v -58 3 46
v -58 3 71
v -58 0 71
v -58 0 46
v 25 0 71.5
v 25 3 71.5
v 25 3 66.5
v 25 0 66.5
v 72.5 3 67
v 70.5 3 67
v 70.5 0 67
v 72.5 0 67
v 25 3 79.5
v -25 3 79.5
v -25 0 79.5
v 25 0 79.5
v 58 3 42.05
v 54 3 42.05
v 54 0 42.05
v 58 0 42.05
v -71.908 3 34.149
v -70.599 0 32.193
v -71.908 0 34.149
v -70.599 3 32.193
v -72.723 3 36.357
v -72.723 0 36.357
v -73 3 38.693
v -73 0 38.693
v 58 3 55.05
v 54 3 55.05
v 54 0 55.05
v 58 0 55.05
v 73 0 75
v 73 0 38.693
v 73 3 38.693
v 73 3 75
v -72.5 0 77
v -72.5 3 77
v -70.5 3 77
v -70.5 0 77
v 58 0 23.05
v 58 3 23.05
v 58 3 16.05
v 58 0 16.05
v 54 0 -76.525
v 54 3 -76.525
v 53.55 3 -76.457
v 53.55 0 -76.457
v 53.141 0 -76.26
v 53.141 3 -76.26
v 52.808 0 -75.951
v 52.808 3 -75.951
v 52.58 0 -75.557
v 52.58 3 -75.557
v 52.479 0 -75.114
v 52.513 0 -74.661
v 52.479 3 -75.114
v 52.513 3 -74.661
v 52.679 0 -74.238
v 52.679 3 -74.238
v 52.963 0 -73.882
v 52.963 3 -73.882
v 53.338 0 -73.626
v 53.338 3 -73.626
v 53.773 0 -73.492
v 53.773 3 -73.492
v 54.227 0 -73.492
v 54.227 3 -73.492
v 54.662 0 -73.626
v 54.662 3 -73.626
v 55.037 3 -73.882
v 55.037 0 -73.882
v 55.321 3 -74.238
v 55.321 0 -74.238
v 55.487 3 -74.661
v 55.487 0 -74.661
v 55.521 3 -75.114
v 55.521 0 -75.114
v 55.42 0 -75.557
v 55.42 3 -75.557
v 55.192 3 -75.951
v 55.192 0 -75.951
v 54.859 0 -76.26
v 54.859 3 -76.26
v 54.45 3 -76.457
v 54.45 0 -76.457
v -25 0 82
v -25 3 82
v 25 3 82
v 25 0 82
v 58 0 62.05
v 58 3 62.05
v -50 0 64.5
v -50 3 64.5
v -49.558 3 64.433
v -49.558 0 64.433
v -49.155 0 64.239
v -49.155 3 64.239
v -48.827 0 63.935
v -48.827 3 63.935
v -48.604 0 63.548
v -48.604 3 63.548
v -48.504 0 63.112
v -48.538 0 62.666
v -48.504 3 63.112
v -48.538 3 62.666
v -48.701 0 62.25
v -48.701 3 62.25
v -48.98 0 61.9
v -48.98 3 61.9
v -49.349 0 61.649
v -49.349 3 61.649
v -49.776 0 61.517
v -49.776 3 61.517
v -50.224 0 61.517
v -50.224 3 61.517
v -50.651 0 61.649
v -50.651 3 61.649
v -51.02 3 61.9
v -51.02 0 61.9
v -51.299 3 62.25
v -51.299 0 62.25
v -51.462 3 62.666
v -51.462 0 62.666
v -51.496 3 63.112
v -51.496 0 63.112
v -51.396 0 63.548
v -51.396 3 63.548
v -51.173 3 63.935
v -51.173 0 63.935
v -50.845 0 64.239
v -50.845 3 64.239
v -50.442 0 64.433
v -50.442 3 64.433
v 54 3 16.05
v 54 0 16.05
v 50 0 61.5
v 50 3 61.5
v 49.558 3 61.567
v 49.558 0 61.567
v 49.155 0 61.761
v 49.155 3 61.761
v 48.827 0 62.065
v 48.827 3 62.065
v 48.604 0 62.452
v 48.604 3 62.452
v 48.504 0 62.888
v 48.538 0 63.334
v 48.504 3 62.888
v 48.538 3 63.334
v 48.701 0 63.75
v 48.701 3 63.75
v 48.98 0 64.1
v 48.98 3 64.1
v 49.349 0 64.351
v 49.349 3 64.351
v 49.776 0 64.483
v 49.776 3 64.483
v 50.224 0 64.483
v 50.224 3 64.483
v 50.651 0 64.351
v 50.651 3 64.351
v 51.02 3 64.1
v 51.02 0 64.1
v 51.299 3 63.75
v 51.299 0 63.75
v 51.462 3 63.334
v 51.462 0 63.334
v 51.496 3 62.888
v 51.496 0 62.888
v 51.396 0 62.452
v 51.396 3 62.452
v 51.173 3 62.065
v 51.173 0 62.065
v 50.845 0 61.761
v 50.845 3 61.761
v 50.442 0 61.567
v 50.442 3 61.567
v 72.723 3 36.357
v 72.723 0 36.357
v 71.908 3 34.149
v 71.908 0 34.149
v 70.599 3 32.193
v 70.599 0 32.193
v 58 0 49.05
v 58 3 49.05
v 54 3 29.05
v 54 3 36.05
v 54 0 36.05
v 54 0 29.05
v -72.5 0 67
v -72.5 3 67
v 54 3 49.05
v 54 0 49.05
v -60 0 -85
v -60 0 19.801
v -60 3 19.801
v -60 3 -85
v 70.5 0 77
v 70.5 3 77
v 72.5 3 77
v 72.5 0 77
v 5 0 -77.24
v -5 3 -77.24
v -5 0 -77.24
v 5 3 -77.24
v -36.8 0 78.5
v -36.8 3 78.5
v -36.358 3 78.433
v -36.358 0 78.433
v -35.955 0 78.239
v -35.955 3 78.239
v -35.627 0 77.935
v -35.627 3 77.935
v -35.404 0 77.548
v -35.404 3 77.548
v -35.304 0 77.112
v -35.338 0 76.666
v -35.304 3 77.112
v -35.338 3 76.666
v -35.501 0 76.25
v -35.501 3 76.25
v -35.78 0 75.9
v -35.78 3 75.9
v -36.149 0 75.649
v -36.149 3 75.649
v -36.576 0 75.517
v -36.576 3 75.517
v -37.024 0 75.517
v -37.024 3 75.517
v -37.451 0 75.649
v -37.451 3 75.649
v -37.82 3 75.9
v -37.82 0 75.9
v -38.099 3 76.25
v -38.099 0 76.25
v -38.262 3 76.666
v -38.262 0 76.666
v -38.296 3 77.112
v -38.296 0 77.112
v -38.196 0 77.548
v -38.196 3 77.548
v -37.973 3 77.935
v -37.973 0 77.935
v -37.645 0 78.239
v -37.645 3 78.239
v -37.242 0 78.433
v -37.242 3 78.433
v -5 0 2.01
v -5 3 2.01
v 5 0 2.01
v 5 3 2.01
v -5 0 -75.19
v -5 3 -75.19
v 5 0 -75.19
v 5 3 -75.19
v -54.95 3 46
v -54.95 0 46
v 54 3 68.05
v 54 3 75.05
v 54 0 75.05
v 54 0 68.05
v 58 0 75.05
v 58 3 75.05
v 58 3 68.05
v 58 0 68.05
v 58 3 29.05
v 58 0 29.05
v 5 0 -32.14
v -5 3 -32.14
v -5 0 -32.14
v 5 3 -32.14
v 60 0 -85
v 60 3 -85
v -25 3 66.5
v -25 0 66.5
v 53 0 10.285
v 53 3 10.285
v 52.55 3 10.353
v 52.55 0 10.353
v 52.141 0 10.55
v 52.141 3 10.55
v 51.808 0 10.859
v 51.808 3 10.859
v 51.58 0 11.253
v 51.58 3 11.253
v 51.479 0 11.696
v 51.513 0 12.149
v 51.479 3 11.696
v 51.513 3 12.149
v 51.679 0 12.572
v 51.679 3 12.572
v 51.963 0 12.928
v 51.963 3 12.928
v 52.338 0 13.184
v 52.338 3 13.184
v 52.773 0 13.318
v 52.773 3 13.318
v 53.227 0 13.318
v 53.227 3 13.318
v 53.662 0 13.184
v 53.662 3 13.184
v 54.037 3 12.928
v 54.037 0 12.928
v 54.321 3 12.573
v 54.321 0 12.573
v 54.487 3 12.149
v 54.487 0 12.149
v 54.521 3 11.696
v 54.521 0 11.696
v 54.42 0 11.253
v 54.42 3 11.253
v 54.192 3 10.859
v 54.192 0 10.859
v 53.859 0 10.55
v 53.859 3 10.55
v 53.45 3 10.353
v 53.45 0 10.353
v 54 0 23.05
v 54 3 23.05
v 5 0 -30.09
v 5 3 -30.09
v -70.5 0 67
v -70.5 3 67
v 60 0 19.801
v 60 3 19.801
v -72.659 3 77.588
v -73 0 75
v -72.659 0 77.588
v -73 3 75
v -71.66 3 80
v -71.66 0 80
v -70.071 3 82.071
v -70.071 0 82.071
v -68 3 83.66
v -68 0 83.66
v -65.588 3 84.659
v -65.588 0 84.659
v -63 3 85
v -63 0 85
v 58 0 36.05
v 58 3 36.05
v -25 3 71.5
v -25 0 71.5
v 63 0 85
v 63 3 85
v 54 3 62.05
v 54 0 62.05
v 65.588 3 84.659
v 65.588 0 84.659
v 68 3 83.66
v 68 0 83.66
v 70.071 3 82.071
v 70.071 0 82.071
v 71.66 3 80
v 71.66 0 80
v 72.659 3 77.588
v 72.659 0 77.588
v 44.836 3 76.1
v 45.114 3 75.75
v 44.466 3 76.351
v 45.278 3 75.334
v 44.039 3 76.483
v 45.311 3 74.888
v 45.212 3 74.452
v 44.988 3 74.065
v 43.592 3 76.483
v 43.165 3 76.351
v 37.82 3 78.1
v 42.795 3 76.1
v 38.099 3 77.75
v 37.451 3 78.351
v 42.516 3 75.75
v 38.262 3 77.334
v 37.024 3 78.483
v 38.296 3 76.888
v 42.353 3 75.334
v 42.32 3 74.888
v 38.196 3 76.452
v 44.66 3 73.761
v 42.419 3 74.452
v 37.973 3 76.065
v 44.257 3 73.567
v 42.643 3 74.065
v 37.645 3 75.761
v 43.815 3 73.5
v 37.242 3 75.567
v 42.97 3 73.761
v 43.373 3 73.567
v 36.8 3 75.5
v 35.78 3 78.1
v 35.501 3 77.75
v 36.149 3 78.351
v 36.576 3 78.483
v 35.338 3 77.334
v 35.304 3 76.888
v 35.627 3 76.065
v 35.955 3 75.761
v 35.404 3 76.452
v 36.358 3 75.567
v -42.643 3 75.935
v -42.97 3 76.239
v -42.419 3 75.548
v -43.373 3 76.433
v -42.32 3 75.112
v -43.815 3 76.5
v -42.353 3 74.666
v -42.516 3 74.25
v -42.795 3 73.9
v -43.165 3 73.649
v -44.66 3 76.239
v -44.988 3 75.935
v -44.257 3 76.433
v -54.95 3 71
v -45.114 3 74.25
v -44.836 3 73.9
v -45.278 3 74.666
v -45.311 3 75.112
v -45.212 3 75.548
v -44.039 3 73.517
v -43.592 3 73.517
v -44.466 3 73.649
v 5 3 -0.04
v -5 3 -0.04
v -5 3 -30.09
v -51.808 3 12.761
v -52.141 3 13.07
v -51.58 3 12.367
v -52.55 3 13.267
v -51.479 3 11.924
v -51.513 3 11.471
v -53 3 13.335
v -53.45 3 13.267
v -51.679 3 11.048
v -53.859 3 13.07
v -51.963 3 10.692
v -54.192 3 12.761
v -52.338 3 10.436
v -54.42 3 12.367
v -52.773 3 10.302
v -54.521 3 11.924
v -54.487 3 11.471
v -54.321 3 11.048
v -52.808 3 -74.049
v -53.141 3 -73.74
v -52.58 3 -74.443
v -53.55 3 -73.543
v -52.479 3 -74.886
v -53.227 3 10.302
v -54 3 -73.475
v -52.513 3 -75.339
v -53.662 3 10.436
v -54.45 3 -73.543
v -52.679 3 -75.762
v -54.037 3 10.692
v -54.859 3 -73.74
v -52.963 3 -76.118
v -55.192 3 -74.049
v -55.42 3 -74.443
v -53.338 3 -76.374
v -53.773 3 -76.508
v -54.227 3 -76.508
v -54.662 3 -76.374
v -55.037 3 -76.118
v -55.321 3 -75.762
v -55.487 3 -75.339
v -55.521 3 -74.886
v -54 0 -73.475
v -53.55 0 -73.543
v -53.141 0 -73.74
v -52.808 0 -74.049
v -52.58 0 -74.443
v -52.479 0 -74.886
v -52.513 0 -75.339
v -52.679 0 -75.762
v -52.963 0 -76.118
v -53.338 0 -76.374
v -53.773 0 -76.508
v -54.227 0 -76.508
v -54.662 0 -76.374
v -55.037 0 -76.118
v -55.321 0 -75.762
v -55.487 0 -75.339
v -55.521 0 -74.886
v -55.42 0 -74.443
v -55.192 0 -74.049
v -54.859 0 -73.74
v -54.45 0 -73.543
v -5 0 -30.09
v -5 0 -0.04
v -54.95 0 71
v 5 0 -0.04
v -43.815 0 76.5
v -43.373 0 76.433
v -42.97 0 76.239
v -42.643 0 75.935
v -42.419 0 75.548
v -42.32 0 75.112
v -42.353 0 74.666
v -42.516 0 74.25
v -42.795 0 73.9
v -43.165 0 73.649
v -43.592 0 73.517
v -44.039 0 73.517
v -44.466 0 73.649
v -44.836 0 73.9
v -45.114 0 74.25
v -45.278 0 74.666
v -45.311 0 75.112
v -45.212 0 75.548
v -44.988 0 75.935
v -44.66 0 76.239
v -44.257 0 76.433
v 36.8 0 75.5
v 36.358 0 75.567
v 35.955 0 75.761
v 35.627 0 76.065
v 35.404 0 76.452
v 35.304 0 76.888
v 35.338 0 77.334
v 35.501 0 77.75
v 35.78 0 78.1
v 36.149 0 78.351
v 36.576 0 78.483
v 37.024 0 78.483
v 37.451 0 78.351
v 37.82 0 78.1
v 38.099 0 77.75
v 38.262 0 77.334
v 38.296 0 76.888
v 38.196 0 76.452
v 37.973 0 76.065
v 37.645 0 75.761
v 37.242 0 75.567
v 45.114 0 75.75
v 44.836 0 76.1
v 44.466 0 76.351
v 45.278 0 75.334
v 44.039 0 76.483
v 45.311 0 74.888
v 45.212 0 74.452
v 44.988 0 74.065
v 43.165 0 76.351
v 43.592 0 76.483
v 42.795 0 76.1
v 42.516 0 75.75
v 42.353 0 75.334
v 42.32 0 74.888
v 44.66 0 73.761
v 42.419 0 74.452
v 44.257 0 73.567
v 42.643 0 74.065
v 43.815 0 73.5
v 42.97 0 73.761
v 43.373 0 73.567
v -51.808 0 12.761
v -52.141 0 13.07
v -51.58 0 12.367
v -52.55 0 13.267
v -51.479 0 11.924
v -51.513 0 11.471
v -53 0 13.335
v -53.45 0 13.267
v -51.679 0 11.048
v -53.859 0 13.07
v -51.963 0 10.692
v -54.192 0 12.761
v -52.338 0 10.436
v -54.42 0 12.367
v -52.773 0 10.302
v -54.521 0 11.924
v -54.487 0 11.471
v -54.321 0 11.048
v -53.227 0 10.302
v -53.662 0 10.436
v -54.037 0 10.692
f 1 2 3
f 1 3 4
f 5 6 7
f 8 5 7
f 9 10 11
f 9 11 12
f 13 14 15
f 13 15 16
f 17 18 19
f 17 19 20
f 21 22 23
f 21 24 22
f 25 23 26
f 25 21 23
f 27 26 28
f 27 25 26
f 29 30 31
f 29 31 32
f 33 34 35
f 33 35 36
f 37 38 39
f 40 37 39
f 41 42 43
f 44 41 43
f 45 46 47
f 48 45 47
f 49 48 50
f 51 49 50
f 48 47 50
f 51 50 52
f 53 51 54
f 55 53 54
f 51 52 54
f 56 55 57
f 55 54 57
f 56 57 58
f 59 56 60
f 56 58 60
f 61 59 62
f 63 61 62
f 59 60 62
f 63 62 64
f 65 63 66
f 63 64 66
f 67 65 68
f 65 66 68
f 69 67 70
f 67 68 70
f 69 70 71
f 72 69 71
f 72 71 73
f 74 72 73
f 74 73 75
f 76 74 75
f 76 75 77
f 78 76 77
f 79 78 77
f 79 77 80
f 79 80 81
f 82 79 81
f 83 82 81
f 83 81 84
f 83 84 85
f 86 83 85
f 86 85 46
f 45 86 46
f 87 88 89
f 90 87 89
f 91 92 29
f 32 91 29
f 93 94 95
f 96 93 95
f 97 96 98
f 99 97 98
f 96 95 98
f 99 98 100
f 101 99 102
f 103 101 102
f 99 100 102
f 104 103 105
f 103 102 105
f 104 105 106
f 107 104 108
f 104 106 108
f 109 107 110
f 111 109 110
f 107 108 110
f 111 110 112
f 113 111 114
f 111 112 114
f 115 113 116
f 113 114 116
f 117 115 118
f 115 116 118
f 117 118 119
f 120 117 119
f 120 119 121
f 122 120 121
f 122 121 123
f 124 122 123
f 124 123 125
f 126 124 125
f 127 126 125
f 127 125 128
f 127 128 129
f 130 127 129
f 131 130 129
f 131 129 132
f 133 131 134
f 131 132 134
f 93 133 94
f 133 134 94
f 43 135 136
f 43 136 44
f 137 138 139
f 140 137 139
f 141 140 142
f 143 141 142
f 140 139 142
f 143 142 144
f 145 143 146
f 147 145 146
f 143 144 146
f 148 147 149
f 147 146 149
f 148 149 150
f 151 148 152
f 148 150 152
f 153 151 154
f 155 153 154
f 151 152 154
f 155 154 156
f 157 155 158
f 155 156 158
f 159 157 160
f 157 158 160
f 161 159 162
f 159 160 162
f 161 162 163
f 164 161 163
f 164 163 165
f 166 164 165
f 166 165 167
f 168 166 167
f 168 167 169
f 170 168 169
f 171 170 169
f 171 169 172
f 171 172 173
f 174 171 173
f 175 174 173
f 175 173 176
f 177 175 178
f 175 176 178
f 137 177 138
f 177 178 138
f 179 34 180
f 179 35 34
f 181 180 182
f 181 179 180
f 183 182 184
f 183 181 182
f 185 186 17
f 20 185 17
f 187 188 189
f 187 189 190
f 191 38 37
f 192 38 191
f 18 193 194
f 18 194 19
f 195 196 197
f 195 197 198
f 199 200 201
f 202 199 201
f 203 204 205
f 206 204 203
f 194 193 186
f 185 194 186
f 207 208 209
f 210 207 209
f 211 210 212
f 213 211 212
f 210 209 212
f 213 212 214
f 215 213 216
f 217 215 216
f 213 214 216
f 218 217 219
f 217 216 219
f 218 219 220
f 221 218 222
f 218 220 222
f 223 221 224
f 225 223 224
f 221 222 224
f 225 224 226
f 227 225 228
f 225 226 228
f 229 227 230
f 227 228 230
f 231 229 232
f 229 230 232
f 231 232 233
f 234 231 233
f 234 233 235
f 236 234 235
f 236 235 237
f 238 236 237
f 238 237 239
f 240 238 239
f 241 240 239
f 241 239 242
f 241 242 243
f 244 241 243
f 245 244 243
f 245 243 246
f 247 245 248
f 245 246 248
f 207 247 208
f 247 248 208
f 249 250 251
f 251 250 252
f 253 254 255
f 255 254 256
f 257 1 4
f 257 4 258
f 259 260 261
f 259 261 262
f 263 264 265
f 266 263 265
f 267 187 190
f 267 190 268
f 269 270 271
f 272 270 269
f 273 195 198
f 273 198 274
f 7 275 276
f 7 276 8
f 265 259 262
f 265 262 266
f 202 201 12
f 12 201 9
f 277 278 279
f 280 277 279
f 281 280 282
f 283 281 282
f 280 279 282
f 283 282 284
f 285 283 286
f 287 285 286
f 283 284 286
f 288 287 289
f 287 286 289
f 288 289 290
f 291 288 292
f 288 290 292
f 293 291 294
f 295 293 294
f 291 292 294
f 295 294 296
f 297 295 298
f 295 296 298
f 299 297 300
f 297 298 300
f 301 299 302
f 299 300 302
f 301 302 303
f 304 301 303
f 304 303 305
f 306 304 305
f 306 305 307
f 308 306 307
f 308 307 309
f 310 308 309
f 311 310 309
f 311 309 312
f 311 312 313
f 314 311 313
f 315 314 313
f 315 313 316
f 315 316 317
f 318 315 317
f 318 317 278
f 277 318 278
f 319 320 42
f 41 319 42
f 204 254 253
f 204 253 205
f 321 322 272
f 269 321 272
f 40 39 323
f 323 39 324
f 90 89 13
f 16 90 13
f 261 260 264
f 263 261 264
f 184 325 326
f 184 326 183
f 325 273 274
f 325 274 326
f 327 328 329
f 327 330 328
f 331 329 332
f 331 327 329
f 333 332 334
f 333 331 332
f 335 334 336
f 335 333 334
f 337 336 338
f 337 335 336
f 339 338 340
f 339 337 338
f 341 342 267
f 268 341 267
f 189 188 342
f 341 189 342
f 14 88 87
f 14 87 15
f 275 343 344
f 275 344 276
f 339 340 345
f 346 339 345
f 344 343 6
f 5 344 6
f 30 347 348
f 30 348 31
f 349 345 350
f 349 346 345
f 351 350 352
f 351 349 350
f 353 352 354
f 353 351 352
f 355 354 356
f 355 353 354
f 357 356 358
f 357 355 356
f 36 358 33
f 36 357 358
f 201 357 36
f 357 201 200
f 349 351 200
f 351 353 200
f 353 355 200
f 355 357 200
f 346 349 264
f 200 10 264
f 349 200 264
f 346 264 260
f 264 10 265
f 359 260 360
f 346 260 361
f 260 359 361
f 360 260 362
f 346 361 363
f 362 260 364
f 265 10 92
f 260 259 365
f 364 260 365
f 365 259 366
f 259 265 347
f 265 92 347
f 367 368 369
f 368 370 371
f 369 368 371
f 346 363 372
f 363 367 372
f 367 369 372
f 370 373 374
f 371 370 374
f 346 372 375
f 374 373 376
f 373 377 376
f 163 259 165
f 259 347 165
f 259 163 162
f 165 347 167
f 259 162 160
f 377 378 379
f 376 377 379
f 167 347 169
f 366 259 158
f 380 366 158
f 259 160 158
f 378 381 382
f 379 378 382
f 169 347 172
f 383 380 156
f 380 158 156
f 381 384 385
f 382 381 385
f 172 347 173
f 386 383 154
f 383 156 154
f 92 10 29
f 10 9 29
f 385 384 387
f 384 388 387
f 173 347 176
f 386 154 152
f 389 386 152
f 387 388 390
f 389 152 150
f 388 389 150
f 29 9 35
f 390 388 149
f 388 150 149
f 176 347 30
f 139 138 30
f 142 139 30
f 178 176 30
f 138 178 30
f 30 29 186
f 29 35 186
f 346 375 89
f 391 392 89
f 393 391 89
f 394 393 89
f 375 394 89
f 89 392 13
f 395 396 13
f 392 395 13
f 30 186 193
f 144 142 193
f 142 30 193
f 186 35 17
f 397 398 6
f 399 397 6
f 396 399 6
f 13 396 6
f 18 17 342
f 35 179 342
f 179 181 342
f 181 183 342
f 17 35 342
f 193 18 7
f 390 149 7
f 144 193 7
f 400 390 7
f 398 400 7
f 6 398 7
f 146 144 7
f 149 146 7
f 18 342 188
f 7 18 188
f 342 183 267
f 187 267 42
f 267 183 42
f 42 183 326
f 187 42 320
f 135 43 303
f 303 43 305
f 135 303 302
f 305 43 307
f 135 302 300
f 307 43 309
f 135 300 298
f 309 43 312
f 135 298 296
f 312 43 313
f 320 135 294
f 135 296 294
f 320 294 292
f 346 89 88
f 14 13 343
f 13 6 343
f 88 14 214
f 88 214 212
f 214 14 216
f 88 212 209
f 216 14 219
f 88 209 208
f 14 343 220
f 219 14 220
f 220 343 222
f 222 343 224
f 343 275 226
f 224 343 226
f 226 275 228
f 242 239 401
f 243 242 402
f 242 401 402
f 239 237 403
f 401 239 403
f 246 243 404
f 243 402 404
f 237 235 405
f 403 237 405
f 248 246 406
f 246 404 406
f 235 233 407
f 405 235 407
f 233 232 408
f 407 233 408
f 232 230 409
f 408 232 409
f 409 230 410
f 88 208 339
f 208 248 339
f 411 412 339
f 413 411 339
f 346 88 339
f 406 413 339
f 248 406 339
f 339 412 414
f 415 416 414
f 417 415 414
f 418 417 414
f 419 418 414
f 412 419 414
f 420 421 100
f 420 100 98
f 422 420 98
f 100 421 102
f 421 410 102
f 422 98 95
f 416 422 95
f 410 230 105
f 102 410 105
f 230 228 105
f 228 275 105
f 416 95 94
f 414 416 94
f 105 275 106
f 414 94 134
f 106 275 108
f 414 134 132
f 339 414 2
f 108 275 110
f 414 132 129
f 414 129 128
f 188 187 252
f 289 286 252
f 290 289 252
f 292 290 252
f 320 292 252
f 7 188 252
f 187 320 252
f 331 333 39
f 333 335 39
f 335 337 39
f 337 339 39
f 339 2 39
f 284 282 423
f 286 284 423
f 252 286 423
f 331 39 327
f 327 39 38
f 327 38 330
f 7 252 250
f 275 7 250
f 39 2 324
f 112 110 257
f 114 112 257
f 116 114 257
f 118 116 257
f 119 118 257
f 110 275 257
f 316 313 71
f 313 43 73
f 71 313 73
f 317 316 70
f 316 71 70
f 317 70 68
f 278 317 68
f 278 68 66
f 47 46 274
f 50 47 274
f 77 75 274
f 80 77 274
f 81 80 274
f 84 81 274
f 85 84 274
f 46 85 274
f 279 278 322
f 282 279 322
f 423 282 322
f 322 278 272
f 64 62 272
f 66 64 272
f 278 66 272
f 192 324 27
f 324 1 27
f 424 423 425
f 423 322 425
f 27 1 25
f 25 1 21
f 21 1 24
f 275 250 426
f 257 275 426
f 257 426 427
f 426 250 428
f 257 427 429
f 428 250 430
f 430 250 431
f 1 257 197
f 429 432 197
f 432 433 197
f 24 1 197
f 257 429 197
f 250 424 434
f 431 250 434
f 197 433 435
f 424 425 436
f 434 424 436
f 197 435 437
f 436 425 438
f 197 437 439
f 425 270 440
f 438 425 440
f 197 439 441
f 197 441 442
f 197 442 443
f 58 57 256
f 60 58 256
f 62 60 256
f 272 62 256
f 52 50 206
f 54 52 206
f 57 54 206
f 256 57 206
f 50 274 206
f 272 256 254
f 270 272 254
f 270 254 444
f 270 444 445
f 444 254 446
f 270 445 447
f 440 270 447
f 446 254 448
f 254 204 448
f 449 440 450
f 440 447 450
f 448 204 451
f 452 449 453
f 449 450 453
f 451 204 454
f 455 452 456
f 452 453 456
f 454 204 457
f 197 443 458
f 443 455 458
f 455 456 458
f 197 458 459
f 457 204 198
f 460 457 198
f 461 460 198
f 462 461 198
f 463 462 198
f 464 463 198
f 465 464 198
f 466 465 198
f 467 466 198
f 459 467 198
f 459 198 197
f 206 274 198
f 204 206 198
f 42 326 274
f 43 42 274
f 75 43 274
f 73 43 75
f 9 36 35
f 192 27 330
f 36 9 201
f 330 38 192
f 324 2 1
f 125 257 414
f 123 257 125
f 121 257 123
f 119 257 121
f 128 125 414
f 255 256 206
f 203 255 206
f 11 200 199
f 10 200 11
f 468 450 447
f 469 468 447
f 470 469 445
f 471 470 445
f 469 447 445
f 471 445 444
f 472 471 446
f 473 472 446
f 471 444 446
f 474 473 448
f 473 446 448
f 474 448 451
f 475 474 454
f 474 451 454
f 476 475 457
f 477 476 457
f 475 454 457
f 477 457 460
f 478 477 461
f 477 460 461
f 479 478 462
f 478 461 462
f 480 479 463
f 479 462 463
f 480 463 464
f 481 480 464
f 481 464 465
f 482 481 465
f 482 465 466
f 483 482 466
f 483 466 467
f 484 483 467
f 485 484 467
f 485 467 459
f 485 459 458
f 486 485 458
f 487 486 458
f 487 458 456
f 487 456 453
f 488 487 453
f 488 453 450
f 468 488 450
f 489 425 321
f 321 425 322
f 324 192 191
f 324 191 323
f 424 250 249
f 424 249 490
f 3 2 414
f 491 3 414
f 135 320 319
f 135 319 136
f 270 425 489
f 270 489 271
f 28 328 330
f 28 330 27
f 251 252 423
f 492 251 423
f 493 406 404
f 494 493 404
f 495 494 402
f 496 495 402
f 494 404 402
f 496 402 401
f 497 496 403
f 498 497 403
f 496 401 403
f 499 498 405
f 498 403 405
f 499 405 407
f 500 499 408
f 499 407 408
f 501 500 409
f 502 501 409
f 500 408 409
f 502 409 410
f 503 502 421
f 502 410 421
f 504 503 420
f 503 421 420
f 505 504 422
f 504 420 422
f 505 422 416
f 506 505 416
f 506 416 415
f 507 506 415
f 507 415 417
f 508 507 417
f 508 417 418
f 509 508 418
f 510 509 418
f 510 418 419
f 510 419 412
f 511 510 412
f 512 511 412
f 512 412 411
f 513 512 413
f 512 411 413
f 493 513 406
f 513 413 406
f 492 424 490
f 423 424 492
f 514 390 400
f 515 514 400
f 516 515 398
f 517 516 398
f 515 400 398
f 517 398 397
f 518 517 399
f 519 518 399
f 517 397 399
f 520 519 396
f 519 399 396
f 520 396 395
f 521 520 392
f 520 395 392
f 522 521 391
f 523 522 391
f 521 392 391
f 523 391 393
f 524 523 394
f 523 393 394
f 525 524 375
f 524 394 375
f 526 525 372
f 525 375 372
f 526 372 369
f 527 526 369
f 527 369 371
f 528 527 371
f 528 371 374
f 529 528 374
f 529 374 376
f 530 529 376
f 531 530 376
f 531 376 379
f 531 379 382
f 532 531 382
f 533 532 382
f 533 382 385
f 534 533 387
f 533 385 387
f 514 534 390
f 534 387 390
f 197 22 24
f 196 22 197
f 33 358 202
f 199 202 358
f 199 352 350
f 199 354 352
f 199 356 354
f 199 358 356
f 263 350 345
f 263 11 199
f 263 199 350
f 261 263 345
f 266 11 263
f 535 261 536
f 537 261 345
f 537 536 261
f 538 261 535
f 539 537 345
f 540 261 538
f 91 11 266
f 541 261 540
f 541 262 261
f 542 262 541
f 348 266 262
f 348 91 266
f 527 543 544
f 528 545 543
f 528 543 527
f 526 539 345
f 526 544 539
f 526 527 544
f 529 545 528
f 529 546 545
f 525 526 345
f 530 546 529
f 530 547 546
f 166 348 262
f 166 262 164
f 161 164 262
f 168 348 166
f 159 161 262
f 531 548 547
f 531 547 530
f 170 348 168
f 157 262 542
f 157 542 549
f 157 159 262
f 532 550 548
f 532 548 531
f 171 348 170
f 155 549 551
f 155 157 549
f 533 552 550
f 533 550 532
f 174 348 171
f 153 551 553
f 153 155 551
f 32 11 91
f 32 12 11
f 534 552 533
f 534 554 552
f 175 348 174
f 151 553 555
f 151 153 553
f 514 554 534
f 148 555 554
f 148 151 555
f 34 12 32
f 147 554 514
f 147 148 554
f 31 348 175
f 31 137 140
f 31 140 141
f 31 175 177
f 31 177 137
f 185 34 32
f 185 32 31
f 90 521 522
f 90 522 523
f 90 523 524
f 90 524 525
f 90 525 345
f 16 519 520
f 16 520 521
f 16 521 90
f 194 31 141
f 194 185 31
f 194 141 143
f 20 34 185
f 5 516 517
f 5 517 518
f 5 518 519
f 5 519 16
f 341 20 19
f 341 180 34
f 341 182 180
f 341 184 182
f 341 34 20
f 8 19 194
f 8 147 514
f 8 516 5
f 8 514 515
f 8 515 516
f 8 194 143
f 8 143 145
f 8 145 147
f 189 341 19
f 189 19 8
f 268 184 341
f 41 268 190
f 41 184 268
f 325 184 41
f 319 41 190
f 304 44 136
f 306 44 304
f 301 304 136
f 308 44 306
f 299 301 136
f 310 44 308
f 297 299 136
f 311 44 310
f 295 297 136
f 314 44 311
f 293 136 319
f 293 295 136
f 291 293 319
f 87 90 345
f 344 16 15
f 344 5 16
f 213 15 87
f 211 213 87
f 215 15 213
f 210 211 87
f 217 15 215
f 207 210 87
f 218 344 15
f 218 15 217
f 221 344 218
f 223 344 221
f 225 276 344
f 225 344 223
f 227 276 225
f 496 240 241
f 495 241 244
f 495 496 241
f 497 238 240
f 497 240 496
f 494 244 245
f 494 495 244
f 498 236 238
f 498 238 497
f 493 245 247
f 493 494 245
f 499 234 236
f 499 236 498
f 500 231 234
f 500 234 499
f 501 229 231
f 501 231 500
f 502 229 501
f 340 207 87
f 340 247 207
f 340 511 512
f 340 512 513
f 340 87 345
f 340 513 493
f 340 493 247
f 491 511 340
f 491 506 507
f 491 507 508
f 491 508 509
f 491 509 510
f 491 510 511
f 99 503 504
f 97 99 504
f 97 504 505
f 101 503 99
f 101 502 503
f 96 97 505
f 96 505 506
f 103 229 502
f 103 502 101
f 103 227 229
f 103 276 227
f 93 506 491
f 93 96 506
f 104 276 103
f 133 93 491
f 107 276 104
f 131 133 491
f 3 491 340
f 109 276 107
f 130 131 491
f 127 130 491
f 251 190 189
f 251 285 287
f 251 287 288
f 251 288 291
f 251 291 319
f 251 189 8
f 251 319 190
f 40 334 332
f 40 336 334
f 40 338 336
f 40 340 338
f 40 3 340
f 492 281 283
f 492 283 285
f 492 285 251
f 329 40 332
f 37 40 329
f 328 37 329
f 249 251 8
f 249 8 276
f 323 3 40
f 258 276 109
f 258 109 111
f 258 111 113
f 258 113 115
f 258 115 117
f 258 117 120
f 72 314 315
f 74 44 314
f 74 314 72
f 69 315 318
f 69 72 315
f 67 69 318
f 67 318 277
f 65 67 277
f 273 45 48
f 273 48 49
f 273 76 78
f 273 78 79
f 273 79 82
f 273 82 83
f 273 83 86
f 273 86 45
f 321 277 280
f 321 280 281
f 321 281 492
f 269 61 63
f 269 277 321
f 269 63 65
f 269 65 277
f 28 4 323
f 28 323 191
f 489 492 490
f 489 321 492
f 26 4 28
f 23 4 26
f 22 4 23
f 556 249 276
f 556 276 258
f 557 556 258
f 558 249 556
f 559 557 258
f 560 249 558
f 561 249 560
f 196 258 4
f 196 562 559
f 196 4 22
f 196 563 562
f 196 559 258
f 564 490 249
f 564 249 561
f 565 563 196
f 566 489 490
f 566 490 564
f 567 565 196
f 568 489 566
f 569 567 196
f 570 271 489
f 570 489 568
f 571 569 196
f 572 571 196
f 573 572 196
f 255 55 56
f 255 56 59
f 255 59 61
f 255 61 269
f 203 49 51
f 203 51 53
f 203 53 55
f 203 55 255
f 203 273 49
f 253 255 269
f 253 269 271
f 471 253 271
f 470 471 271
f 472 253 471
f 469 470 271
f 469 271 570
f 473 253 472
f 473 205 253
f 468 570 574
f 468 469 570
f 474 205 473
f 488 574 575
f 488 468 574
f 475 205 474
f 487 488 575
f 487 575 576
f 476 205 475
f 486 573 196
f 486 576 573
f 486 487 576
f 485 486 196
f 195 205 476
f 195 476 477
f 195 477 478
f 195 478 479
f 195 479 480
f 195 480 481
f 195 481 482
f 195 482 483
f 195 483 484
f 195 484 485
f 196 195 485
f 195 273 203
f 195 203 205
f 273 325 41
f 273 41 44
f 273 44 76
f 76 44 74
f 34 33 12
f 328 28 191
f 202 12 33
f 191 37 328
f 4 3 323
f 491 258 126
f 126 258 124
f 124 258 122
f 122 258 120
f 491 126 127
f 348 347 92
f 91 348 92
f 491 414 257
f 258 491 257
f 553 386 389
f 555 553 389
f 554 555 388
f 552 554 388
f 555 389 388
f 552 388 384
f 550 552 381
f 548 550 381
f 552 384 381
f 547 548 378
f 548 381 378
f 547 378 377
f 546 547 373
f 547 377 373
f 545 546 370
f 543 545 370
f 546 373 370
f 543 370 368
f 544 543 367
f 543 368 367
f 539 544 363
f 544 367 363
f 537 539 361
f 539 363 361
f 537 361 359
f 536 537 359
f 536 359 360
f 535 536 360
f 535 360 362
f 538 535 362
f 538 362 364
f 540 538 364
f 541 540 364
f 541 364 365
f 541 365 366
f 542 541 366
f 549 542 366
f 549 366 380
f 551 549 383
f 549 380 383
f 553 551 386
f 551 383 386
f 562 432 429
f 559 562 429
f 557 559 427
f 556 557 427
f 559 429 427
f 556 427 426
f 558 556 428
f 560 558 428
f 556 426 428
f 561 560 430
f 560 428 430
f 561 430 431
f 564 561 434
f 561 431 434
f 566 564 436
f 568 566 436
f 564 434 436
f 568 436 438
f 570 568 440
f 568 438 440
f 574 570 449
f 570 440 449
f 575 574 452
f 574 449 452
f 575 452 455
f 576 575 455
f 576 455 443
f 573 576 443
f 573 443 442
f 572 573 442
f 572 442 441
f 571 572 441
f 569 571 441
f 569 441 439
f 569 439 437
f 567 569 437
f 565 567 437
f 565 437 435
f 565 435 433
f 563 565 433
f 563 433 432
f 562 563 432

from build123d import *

# Parameters (mm, degrees)
BOSS_EXTRUDE1_DEPTH = 3
SKETCH2_R           = 1.525
CUT_EXTRUDE1_DEPTH  = 113.084789334
SKETCH3_W           = 10
SKETCH3_H           = 2.05
CUT_EXTRUDE2_DEPTH  = 113.084789334
SKETCH4_R           = 1.5
CUT_EXTRUDE3_DEPTH  = 3
SKETCH5_R           = 1.5
SKETCH5_W           = 50
SKETCH5_H           = 5
CUT_EXTRUDE4_DEPTH  = 3
SKETCH6_W           = 4
SKETCH6_H           = 7
CUT_EXTRUDE5_DEPTH  = 10
SKETCH7_W           = 50
SKETCH7_H           = 2.5
SKETCH7_W_2         = 3.05
SKETCH7_H_2         = 25
CUT_EXTRUDE6_DEPTH  = 10
FILLET3_R           = 10
SKETCH8_W           = 2
SKETCH8_H           = 10
CUT_EXTRUDE7_DEPTH  = 10


with BuildPart() as part:
    # Sketch1 → Boss-Extrude1 (new body)
    with BuildSketch(Plane(origin=(0, 0, 0), x_dir=(1, 0, 0), z_dir=(0, 1, 0))):
        Polygon((-73, -35), (-60, -19.801315846), (-60, 85), (60, 85), (60, -19.801315846), (73, -35), (73, -85), (60, -85), (-60, -85), (-73, -85), align=None)
    extrude(amount=BOSS_EXTRUDE1_DEPTH)

    # Sketch2 → Cut-Extrude1 (cut, through all)
    with BuildSketch(Plane(origin=(0, 3, 0), x_dir=(1, 0, 0), z_dir=(0, 1, 0))):
        with Locations(Location((-53, -11.81, 0), (0, 0, 270))):
            Circle(SKETCH2_R)
        with Locations(Location((-54, 75, 0), (0, 0, 270))):
            Circle(SKETCH2_R)
        with Locations(Location((53, -11.81, 0), (0, 0, 90))):
            Circle(SKETCH2_R)
        with Locations(Location((54, 75, 0), (0, 0, 90))):
            Circle(SKETCH2_R)
    extrude(amount=-CUT_EXTRUDE1_DEPTH, mode=Mode.SUBTRACT)

    # Sketch3 → Cut-Extrude2 (cut, through all)
    with BuildSketch(Plane(origin=(0, 3, 0), x_dir=(1, 0, 0), z_dir=(0, 1, 0))):
        with Locations((0, 31.115)):
            Rectangle(SKETCH3_W, SKETCH3_H)
        with Locations((0, -0.985)):
            Rectangle(SKETCH3_W, SKETCH3_H)
        with Locations((0, 76.215)):
            Rectangle(SKETCH3_W, SKETCH3_H)
    extrude(amount=-CUT_EXTRUDE2_DEPTH, mode=Mode.SUBTRACT)

    # Sketch4 → Cut-Extrude3 (cut)
    with BuildSketch(Plane(origin=(0, 3, 0), x_dir=(1, 0, 0), z_dir=(0, 1, 0))):
        with Locations(Location((-50, -63, 0), (0, 0, 270))):
            Circle(SKETCH4_R)
        with Locations(Location((-43.815341562, -75, 0), (0, 0, 270))):
            Circle(SKETCH4_R)
        with Locations(Location((43.815341562, -75, 0), (0, 0, 90))):
            Circle(SKETCH4_R)
        with Locations(Location((50, -63, 0), (0, 0, 90))):
            Circle(SKETCH4_R)
    extrude(amount=-CUT_EXTRUDE3_DEPTH, mode=Mode.SUBTRACT)

    # Sketch5 → Cut-Extrude4 (cut)
    with BuildSketch(Plane(origin=(0, 3, 0), x_dir=(1, 0, 0), z_dir=(0, 1, 0))):
        with Locations(Location((-36.8, -77, 0), (0, 0, 270))):
            Circle(SKETCH5_R)
        with Locations(Location((36.8, -77, 0), (0, 0, 90))):
            Circle(SKETCH5_R)
        with Locations((0, -69)):
            Rectangle(SKETCH5_W, SKETCH5_H)
    extrude(amount=-CUT_EXTRUDE4_DEPTH, mode=Mode.SUBTRACT)

    # Sketch6 → Cut-Extrude5 (cut)
    with BuildSketch(Plane(origin=(0, 3, 0), x_dir=(1, 0, 0), z_dir=(0, 1, 0))):
        with Locations((56, -32.549614417)):
            Rectangle(SKETCH6_W, SKETCH6_H)
        with Locations((56, -19.549614417)):
            Rectangle(SKETCH6_W, SKETCH6_H)
        with Locations((56, -45.549614417)):
            Rectangle(SKETCH6_W, SKETCH6_H)
        with Locations((56, -58.549614417)):
            Rectangle(SKETCH6_W, SKETCH6_H)
        with Locations((56, -71.549614417)):
            Rectangle(SKETCH6_W, SKETCH6_H)
    extrude(amount=-CUT_EXTRUDE5_DEPTH, mode=Mode.SUBTRACT)

    # Sketch7 → Cut-Extrude6 (cut)
    with BuildSketch(Plane(origin=(0, 3, 0), x_dir=(1, 0, 0), z_dir=(0, 1, 0))):
        with Locations((0, -80.75)):
            Rectangle(SKETCH7_W, SKETCH7_H)
        with Locations((-56.475, -58.5)):
            Rectangle(SKETCH7_W_2, SKETCH7_H_2)
    extrude(amount=-CUT_EXTRUDE6_DEPTH, mode=Mode.SUBTRACT)

    # Fillet3
    fillet3_edges = [part.edges().sort_by_distance(p)[0] for p in [
        (73, 1.5, 35),
        (73, 1.5, 85),
        (-73, 1.5, 85),
        (-73, 1.5, 35),
    ]]
    fillet(fillet3_edges, radius=FILLET3_R)

    # Sketch8 → Cut-Extrude7 (cut)
    with BuildSketch(Plane(origin=(0, 3, 0), x_dir=(1, 0, 0), z_dir=(0, 1, 0))):
        with Locations((71.5, -72)):
            Rectangle(SKETCH8_W, SKETCH8_H)
        with Locations((-71.5, -72)):
            Rectangle(SKETCH8_W, SKETCH8_H)
    extrude(amount=-CUT_EXTRUDE7_DEPTH, mode=Mode.SUBTRACT)


solid = part.part
